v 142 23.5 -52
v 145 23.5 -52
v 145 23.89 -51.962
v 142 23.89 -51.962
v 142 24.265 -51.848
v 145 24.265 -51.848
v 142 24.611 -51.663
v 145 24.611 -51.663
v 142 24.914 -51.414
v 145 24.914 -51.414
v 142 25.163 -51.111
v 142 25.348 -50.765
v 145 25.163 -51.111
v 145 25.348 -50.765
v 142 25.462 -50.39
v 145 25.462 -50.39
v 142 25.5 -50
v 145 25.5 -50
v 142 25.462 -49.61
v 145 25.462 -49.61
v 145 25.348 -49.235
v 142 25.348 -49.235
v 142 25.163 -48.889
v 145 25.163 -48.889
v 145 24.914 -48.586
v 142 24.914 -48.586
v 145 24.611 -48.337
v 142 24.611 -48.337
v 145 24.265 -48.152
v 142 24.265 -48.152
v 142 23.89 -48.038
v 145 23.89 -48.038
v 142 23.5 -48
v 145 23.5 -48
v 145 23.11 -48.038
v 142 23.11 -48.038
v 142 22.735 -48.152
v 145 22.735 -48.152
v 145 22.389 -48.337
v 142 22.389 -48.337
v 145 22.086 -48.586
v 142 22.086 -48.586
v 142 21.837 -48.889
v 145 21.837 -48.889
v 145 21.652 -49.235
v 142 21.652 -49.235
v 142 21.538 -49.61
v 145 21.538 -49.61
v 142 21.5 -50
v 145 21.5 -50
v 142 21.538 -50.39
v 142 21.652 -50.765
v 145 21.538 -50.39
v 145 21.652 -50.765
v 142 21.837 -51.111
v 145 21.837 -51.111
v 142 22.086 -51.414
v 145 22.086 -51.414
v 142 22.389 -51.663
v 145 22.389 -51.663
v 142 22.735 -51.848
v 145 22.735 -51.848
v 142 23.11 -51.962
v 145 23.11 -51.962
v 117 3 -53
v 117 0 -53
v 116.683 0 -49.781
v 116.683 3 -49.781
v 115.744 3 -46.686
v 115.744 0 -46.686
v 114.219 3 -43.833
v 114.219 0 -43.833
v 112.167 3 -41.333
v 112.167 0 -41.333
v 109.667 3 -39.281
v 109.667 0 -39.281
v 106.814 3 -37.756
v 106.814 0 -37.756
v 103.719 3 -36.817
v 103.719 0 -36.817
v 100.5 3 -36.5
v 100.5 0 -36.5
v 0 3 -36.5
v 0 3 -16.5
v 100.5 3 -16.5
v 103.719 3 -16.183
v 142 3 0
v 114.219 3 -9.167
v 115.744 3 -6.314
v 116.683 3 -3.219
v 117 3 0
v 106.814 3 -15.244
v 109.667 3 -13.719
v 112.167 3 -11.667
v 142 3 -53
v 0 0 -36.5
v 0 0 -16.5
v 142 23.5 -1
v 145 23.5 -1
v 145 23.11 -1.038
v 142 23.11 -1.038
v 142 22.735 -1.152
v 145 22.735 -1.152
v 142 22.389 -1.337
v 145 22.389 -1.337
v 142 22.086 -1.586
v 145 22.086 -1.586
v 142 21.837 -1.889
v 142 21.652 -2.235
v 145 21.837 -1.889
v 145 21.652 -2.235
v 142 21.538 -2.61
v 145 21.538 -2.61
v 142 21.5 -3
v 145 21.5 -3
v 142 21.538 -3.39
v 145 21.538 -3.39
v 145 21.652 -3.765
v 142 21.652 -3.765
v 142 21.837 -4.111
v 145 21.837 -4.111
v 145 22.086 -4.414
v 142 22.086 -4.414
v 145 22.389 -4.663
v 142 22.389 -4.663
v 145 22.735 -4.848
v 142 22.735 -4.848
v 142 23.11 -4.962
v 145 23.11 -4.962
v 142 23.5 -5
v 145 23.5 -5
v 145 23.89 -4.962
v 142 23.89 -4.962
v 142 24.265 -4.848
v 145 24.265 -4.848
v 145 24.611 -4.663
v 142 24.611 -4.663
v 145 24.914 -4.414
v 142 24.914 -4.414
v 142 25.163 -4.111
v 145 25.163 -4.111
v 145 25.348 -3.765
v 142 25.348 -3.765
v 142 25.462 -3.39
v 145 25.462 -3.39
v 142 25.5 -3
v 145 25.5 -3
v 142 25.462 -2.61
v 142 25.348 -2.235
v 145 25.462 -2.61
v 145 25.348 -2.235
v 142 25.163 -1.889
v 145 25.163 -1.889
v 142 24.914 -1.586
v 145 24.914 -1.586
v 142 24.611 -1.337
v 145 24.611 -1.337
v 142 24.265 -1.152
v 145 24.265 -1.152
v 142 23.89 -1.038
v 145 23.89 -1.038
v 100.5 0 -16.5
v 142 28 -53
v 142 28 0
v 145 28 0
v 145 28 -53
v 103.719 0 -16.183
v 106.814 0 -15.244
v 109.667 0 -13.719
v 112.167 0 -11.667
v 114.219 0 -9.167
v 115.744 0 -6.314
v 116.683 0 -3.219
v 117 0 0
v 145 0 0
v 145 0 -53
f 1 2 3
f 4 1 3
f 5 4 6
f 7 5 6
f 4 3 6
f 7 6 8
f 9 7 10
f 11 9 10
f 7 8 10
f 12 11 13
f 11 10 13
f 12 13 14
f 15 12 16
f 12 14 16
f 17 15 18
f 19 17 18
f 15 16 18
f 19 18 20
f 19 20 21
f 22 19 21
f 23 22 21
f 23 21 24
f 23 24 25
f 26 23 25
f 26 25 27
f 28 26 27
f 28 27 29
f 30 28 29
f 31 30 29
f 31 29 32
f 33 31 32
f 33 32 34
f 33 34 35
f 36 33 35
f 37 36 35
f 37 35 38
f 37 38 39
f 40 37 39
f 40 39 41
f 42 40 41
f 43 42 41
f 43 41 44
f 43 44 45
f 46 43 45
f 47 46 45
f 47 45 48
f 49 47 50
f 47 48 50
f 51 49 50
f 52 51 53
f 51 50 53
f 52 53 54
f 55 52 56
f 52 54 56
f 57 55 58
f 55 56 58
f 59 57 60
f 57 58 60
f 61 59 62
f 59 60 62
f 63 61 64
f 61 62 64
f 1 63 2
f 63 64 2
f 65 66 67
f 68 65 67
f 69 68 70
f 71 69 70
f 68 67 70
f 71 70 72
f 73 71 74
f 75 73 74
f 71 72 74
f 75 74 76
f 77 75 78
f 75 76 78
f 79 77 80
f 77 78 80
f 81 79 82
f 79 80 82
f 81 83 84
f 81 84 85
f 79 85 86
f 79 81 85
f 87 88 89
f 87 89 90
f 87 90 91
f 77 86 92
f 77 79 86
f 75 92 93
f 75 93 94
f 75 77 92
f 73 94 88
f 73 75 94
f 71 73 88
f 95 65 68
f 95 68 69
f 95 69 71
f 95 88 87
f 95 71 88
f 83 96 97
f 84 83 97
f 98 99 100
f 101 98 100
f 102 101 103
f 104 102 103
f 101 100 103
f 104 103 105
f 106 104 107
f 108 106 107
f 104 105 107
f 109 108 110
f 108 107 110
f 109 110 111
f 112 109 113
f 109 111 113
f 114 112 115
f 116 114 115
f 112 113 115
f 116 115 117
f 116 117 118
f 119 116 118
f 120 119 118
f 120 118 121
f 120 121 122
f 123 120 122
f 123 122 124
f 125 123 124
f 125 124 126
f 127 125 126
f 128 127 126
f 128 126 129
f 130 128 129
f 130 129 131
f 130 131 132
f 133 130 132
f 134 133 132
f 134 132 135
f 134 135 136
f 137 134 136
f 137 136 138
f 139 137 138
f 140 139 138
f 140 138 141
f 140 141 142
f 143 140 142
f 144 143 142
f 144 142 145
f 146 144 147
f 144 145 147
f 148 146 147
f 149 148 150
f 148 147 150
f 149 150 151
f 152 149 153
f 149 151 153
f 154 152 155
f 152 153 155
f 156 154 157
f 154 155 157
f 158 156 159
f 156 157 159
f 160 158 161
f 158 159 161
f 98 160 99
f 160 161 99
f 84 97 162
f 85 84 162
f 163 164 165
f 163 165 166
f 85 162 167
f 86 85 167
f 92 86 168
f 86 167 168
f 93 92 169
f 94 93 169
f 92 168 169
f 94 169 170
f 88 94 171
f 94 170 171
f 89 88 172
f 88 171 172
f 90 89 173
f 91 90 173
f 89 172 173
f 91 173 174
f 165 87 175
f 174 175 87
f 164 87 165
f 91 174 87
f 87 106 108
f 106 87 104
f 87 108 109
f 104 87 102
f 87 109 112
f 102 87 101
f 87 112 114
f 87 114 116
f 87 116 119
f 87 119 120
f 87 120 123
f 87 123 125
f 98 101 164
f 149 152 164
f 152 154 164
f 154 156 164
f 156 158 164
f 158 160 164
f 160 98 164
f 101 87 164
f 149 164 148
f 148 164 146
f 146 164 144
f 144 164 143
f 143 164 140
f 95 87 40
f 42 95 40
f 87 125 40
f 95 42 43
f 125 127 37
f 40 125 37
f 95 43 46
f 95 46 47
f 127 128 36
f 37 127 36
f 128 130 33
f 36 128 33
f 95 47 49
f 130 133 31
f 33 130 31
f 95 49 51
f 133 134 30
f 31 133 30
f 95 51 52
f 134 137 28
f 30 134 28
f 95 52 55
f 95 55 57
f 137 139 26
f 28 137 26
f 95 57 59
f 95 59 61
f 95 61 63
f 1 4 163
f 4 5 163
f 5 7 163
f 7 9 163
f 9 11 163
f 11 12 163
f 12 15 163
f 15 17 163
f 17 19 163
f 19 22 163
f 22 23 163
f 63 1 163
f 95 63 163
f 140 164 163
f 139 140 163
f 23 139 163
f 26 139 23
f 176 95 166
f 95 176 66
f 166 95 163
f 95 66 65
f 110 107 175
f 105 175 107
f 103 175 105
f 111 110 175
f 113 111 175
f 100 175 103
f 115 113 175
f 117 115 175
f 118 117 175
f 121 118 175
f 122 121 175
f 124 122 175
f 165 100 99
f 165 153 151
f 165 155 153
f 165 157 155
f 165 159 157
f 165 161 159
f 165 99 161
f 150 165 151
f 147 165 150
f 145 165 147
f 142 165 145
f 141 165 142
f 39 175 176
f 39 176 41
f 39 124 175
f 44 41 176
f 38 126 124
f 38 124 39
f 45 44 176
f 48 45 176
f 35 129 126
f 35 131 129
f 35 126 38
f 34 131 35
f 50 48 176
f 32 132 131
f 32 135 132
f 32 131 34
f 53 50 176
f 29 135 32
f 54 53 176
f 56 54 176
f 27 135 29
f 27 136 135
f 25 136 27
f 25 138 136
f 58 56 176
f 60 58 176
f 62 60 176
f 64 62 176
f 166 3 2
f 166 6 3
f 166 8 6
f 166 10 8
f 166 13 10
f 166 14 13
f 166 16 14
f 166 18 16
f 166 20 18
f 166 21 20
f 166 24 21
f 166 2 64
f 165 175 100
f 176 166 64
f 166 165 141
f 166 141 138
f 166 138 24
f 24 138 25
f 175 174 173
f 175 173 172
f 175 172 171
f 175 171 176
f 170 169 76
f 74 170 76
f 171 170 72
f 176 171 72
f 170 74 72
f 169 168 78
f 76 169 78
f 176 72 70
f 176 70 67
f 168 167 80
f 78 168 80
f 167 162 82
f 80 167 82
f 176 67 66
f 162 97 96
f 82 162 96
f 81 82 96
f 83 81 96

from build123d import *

# Parameters (mm, degrees)
EXTRUDE_1_DEPTH     = 3
SKETCH_2_W          = 53
SKETCH_2_H          = 28
EXTRUDE_2_DEPTH     = 3
SKETCH_3_R          = 2
CUT_EXTRUDE_1_DEPTH = 157.901242825


with BuildPart() as part:
    # 草图1 → 凸台-拉伸1 (new body)
    with BuildSketch(Plane(origin=(0, 0, 0), x_dir=(1, 0, 0), z_dir=(0, 1, 0))):
        with BuildLine():
            Line((117, 0), (142, 0))
            Line((142, 0), (142, 53))
            Line((142, 53), (117, 53))
            ThreePointArc((117, 53), (112.16726189, 41.33273811), (100.5, 36.5))
            Line((100.5, 36.5), (0, 36.5))
            Line((0, 36.5), (0, 16.5))
            Line((0, 16.5), (100.5, 16.5))
            ThreePointArc((100.5, 16.5), (112.16726189, 11.66726189), (117, 0))
        make_face()
    extrude(amount=EXTRUDE_1_DEPTH)

    # 草图2 → 凸台-拉伸2 (add)
    with BuildSketch(Plane(origin=(142, 0, 0), x_dir=(0, 0, -1), z_dir=(1, 0, 0))):
        with Locations((26.5, 14)):
            Rectangle(SKETCH_2_W, SKETCH_2_H)
    extrude(amount=EXTRUDE_2_DEPTH)

    # 草图3 → 切除-拉伸1 (cut, through all)
    with BuildSketch(Plane(origin=(145, 0, 0), x_dir=(0, 0, -1), z_dir=(1, 0, 0))):
        with Locations((50, 23.5)):
            Circle(SKETCH_3_R)
        with Locations(Location((3, 23.5, 0), (0, 0, 180))):
            Circle(SKETCH_3_R)
    extrude(amount=-CUT_EXTRUDE_1_DEPTH, mode=Mode.SUBTRACT)


solid = part.part
